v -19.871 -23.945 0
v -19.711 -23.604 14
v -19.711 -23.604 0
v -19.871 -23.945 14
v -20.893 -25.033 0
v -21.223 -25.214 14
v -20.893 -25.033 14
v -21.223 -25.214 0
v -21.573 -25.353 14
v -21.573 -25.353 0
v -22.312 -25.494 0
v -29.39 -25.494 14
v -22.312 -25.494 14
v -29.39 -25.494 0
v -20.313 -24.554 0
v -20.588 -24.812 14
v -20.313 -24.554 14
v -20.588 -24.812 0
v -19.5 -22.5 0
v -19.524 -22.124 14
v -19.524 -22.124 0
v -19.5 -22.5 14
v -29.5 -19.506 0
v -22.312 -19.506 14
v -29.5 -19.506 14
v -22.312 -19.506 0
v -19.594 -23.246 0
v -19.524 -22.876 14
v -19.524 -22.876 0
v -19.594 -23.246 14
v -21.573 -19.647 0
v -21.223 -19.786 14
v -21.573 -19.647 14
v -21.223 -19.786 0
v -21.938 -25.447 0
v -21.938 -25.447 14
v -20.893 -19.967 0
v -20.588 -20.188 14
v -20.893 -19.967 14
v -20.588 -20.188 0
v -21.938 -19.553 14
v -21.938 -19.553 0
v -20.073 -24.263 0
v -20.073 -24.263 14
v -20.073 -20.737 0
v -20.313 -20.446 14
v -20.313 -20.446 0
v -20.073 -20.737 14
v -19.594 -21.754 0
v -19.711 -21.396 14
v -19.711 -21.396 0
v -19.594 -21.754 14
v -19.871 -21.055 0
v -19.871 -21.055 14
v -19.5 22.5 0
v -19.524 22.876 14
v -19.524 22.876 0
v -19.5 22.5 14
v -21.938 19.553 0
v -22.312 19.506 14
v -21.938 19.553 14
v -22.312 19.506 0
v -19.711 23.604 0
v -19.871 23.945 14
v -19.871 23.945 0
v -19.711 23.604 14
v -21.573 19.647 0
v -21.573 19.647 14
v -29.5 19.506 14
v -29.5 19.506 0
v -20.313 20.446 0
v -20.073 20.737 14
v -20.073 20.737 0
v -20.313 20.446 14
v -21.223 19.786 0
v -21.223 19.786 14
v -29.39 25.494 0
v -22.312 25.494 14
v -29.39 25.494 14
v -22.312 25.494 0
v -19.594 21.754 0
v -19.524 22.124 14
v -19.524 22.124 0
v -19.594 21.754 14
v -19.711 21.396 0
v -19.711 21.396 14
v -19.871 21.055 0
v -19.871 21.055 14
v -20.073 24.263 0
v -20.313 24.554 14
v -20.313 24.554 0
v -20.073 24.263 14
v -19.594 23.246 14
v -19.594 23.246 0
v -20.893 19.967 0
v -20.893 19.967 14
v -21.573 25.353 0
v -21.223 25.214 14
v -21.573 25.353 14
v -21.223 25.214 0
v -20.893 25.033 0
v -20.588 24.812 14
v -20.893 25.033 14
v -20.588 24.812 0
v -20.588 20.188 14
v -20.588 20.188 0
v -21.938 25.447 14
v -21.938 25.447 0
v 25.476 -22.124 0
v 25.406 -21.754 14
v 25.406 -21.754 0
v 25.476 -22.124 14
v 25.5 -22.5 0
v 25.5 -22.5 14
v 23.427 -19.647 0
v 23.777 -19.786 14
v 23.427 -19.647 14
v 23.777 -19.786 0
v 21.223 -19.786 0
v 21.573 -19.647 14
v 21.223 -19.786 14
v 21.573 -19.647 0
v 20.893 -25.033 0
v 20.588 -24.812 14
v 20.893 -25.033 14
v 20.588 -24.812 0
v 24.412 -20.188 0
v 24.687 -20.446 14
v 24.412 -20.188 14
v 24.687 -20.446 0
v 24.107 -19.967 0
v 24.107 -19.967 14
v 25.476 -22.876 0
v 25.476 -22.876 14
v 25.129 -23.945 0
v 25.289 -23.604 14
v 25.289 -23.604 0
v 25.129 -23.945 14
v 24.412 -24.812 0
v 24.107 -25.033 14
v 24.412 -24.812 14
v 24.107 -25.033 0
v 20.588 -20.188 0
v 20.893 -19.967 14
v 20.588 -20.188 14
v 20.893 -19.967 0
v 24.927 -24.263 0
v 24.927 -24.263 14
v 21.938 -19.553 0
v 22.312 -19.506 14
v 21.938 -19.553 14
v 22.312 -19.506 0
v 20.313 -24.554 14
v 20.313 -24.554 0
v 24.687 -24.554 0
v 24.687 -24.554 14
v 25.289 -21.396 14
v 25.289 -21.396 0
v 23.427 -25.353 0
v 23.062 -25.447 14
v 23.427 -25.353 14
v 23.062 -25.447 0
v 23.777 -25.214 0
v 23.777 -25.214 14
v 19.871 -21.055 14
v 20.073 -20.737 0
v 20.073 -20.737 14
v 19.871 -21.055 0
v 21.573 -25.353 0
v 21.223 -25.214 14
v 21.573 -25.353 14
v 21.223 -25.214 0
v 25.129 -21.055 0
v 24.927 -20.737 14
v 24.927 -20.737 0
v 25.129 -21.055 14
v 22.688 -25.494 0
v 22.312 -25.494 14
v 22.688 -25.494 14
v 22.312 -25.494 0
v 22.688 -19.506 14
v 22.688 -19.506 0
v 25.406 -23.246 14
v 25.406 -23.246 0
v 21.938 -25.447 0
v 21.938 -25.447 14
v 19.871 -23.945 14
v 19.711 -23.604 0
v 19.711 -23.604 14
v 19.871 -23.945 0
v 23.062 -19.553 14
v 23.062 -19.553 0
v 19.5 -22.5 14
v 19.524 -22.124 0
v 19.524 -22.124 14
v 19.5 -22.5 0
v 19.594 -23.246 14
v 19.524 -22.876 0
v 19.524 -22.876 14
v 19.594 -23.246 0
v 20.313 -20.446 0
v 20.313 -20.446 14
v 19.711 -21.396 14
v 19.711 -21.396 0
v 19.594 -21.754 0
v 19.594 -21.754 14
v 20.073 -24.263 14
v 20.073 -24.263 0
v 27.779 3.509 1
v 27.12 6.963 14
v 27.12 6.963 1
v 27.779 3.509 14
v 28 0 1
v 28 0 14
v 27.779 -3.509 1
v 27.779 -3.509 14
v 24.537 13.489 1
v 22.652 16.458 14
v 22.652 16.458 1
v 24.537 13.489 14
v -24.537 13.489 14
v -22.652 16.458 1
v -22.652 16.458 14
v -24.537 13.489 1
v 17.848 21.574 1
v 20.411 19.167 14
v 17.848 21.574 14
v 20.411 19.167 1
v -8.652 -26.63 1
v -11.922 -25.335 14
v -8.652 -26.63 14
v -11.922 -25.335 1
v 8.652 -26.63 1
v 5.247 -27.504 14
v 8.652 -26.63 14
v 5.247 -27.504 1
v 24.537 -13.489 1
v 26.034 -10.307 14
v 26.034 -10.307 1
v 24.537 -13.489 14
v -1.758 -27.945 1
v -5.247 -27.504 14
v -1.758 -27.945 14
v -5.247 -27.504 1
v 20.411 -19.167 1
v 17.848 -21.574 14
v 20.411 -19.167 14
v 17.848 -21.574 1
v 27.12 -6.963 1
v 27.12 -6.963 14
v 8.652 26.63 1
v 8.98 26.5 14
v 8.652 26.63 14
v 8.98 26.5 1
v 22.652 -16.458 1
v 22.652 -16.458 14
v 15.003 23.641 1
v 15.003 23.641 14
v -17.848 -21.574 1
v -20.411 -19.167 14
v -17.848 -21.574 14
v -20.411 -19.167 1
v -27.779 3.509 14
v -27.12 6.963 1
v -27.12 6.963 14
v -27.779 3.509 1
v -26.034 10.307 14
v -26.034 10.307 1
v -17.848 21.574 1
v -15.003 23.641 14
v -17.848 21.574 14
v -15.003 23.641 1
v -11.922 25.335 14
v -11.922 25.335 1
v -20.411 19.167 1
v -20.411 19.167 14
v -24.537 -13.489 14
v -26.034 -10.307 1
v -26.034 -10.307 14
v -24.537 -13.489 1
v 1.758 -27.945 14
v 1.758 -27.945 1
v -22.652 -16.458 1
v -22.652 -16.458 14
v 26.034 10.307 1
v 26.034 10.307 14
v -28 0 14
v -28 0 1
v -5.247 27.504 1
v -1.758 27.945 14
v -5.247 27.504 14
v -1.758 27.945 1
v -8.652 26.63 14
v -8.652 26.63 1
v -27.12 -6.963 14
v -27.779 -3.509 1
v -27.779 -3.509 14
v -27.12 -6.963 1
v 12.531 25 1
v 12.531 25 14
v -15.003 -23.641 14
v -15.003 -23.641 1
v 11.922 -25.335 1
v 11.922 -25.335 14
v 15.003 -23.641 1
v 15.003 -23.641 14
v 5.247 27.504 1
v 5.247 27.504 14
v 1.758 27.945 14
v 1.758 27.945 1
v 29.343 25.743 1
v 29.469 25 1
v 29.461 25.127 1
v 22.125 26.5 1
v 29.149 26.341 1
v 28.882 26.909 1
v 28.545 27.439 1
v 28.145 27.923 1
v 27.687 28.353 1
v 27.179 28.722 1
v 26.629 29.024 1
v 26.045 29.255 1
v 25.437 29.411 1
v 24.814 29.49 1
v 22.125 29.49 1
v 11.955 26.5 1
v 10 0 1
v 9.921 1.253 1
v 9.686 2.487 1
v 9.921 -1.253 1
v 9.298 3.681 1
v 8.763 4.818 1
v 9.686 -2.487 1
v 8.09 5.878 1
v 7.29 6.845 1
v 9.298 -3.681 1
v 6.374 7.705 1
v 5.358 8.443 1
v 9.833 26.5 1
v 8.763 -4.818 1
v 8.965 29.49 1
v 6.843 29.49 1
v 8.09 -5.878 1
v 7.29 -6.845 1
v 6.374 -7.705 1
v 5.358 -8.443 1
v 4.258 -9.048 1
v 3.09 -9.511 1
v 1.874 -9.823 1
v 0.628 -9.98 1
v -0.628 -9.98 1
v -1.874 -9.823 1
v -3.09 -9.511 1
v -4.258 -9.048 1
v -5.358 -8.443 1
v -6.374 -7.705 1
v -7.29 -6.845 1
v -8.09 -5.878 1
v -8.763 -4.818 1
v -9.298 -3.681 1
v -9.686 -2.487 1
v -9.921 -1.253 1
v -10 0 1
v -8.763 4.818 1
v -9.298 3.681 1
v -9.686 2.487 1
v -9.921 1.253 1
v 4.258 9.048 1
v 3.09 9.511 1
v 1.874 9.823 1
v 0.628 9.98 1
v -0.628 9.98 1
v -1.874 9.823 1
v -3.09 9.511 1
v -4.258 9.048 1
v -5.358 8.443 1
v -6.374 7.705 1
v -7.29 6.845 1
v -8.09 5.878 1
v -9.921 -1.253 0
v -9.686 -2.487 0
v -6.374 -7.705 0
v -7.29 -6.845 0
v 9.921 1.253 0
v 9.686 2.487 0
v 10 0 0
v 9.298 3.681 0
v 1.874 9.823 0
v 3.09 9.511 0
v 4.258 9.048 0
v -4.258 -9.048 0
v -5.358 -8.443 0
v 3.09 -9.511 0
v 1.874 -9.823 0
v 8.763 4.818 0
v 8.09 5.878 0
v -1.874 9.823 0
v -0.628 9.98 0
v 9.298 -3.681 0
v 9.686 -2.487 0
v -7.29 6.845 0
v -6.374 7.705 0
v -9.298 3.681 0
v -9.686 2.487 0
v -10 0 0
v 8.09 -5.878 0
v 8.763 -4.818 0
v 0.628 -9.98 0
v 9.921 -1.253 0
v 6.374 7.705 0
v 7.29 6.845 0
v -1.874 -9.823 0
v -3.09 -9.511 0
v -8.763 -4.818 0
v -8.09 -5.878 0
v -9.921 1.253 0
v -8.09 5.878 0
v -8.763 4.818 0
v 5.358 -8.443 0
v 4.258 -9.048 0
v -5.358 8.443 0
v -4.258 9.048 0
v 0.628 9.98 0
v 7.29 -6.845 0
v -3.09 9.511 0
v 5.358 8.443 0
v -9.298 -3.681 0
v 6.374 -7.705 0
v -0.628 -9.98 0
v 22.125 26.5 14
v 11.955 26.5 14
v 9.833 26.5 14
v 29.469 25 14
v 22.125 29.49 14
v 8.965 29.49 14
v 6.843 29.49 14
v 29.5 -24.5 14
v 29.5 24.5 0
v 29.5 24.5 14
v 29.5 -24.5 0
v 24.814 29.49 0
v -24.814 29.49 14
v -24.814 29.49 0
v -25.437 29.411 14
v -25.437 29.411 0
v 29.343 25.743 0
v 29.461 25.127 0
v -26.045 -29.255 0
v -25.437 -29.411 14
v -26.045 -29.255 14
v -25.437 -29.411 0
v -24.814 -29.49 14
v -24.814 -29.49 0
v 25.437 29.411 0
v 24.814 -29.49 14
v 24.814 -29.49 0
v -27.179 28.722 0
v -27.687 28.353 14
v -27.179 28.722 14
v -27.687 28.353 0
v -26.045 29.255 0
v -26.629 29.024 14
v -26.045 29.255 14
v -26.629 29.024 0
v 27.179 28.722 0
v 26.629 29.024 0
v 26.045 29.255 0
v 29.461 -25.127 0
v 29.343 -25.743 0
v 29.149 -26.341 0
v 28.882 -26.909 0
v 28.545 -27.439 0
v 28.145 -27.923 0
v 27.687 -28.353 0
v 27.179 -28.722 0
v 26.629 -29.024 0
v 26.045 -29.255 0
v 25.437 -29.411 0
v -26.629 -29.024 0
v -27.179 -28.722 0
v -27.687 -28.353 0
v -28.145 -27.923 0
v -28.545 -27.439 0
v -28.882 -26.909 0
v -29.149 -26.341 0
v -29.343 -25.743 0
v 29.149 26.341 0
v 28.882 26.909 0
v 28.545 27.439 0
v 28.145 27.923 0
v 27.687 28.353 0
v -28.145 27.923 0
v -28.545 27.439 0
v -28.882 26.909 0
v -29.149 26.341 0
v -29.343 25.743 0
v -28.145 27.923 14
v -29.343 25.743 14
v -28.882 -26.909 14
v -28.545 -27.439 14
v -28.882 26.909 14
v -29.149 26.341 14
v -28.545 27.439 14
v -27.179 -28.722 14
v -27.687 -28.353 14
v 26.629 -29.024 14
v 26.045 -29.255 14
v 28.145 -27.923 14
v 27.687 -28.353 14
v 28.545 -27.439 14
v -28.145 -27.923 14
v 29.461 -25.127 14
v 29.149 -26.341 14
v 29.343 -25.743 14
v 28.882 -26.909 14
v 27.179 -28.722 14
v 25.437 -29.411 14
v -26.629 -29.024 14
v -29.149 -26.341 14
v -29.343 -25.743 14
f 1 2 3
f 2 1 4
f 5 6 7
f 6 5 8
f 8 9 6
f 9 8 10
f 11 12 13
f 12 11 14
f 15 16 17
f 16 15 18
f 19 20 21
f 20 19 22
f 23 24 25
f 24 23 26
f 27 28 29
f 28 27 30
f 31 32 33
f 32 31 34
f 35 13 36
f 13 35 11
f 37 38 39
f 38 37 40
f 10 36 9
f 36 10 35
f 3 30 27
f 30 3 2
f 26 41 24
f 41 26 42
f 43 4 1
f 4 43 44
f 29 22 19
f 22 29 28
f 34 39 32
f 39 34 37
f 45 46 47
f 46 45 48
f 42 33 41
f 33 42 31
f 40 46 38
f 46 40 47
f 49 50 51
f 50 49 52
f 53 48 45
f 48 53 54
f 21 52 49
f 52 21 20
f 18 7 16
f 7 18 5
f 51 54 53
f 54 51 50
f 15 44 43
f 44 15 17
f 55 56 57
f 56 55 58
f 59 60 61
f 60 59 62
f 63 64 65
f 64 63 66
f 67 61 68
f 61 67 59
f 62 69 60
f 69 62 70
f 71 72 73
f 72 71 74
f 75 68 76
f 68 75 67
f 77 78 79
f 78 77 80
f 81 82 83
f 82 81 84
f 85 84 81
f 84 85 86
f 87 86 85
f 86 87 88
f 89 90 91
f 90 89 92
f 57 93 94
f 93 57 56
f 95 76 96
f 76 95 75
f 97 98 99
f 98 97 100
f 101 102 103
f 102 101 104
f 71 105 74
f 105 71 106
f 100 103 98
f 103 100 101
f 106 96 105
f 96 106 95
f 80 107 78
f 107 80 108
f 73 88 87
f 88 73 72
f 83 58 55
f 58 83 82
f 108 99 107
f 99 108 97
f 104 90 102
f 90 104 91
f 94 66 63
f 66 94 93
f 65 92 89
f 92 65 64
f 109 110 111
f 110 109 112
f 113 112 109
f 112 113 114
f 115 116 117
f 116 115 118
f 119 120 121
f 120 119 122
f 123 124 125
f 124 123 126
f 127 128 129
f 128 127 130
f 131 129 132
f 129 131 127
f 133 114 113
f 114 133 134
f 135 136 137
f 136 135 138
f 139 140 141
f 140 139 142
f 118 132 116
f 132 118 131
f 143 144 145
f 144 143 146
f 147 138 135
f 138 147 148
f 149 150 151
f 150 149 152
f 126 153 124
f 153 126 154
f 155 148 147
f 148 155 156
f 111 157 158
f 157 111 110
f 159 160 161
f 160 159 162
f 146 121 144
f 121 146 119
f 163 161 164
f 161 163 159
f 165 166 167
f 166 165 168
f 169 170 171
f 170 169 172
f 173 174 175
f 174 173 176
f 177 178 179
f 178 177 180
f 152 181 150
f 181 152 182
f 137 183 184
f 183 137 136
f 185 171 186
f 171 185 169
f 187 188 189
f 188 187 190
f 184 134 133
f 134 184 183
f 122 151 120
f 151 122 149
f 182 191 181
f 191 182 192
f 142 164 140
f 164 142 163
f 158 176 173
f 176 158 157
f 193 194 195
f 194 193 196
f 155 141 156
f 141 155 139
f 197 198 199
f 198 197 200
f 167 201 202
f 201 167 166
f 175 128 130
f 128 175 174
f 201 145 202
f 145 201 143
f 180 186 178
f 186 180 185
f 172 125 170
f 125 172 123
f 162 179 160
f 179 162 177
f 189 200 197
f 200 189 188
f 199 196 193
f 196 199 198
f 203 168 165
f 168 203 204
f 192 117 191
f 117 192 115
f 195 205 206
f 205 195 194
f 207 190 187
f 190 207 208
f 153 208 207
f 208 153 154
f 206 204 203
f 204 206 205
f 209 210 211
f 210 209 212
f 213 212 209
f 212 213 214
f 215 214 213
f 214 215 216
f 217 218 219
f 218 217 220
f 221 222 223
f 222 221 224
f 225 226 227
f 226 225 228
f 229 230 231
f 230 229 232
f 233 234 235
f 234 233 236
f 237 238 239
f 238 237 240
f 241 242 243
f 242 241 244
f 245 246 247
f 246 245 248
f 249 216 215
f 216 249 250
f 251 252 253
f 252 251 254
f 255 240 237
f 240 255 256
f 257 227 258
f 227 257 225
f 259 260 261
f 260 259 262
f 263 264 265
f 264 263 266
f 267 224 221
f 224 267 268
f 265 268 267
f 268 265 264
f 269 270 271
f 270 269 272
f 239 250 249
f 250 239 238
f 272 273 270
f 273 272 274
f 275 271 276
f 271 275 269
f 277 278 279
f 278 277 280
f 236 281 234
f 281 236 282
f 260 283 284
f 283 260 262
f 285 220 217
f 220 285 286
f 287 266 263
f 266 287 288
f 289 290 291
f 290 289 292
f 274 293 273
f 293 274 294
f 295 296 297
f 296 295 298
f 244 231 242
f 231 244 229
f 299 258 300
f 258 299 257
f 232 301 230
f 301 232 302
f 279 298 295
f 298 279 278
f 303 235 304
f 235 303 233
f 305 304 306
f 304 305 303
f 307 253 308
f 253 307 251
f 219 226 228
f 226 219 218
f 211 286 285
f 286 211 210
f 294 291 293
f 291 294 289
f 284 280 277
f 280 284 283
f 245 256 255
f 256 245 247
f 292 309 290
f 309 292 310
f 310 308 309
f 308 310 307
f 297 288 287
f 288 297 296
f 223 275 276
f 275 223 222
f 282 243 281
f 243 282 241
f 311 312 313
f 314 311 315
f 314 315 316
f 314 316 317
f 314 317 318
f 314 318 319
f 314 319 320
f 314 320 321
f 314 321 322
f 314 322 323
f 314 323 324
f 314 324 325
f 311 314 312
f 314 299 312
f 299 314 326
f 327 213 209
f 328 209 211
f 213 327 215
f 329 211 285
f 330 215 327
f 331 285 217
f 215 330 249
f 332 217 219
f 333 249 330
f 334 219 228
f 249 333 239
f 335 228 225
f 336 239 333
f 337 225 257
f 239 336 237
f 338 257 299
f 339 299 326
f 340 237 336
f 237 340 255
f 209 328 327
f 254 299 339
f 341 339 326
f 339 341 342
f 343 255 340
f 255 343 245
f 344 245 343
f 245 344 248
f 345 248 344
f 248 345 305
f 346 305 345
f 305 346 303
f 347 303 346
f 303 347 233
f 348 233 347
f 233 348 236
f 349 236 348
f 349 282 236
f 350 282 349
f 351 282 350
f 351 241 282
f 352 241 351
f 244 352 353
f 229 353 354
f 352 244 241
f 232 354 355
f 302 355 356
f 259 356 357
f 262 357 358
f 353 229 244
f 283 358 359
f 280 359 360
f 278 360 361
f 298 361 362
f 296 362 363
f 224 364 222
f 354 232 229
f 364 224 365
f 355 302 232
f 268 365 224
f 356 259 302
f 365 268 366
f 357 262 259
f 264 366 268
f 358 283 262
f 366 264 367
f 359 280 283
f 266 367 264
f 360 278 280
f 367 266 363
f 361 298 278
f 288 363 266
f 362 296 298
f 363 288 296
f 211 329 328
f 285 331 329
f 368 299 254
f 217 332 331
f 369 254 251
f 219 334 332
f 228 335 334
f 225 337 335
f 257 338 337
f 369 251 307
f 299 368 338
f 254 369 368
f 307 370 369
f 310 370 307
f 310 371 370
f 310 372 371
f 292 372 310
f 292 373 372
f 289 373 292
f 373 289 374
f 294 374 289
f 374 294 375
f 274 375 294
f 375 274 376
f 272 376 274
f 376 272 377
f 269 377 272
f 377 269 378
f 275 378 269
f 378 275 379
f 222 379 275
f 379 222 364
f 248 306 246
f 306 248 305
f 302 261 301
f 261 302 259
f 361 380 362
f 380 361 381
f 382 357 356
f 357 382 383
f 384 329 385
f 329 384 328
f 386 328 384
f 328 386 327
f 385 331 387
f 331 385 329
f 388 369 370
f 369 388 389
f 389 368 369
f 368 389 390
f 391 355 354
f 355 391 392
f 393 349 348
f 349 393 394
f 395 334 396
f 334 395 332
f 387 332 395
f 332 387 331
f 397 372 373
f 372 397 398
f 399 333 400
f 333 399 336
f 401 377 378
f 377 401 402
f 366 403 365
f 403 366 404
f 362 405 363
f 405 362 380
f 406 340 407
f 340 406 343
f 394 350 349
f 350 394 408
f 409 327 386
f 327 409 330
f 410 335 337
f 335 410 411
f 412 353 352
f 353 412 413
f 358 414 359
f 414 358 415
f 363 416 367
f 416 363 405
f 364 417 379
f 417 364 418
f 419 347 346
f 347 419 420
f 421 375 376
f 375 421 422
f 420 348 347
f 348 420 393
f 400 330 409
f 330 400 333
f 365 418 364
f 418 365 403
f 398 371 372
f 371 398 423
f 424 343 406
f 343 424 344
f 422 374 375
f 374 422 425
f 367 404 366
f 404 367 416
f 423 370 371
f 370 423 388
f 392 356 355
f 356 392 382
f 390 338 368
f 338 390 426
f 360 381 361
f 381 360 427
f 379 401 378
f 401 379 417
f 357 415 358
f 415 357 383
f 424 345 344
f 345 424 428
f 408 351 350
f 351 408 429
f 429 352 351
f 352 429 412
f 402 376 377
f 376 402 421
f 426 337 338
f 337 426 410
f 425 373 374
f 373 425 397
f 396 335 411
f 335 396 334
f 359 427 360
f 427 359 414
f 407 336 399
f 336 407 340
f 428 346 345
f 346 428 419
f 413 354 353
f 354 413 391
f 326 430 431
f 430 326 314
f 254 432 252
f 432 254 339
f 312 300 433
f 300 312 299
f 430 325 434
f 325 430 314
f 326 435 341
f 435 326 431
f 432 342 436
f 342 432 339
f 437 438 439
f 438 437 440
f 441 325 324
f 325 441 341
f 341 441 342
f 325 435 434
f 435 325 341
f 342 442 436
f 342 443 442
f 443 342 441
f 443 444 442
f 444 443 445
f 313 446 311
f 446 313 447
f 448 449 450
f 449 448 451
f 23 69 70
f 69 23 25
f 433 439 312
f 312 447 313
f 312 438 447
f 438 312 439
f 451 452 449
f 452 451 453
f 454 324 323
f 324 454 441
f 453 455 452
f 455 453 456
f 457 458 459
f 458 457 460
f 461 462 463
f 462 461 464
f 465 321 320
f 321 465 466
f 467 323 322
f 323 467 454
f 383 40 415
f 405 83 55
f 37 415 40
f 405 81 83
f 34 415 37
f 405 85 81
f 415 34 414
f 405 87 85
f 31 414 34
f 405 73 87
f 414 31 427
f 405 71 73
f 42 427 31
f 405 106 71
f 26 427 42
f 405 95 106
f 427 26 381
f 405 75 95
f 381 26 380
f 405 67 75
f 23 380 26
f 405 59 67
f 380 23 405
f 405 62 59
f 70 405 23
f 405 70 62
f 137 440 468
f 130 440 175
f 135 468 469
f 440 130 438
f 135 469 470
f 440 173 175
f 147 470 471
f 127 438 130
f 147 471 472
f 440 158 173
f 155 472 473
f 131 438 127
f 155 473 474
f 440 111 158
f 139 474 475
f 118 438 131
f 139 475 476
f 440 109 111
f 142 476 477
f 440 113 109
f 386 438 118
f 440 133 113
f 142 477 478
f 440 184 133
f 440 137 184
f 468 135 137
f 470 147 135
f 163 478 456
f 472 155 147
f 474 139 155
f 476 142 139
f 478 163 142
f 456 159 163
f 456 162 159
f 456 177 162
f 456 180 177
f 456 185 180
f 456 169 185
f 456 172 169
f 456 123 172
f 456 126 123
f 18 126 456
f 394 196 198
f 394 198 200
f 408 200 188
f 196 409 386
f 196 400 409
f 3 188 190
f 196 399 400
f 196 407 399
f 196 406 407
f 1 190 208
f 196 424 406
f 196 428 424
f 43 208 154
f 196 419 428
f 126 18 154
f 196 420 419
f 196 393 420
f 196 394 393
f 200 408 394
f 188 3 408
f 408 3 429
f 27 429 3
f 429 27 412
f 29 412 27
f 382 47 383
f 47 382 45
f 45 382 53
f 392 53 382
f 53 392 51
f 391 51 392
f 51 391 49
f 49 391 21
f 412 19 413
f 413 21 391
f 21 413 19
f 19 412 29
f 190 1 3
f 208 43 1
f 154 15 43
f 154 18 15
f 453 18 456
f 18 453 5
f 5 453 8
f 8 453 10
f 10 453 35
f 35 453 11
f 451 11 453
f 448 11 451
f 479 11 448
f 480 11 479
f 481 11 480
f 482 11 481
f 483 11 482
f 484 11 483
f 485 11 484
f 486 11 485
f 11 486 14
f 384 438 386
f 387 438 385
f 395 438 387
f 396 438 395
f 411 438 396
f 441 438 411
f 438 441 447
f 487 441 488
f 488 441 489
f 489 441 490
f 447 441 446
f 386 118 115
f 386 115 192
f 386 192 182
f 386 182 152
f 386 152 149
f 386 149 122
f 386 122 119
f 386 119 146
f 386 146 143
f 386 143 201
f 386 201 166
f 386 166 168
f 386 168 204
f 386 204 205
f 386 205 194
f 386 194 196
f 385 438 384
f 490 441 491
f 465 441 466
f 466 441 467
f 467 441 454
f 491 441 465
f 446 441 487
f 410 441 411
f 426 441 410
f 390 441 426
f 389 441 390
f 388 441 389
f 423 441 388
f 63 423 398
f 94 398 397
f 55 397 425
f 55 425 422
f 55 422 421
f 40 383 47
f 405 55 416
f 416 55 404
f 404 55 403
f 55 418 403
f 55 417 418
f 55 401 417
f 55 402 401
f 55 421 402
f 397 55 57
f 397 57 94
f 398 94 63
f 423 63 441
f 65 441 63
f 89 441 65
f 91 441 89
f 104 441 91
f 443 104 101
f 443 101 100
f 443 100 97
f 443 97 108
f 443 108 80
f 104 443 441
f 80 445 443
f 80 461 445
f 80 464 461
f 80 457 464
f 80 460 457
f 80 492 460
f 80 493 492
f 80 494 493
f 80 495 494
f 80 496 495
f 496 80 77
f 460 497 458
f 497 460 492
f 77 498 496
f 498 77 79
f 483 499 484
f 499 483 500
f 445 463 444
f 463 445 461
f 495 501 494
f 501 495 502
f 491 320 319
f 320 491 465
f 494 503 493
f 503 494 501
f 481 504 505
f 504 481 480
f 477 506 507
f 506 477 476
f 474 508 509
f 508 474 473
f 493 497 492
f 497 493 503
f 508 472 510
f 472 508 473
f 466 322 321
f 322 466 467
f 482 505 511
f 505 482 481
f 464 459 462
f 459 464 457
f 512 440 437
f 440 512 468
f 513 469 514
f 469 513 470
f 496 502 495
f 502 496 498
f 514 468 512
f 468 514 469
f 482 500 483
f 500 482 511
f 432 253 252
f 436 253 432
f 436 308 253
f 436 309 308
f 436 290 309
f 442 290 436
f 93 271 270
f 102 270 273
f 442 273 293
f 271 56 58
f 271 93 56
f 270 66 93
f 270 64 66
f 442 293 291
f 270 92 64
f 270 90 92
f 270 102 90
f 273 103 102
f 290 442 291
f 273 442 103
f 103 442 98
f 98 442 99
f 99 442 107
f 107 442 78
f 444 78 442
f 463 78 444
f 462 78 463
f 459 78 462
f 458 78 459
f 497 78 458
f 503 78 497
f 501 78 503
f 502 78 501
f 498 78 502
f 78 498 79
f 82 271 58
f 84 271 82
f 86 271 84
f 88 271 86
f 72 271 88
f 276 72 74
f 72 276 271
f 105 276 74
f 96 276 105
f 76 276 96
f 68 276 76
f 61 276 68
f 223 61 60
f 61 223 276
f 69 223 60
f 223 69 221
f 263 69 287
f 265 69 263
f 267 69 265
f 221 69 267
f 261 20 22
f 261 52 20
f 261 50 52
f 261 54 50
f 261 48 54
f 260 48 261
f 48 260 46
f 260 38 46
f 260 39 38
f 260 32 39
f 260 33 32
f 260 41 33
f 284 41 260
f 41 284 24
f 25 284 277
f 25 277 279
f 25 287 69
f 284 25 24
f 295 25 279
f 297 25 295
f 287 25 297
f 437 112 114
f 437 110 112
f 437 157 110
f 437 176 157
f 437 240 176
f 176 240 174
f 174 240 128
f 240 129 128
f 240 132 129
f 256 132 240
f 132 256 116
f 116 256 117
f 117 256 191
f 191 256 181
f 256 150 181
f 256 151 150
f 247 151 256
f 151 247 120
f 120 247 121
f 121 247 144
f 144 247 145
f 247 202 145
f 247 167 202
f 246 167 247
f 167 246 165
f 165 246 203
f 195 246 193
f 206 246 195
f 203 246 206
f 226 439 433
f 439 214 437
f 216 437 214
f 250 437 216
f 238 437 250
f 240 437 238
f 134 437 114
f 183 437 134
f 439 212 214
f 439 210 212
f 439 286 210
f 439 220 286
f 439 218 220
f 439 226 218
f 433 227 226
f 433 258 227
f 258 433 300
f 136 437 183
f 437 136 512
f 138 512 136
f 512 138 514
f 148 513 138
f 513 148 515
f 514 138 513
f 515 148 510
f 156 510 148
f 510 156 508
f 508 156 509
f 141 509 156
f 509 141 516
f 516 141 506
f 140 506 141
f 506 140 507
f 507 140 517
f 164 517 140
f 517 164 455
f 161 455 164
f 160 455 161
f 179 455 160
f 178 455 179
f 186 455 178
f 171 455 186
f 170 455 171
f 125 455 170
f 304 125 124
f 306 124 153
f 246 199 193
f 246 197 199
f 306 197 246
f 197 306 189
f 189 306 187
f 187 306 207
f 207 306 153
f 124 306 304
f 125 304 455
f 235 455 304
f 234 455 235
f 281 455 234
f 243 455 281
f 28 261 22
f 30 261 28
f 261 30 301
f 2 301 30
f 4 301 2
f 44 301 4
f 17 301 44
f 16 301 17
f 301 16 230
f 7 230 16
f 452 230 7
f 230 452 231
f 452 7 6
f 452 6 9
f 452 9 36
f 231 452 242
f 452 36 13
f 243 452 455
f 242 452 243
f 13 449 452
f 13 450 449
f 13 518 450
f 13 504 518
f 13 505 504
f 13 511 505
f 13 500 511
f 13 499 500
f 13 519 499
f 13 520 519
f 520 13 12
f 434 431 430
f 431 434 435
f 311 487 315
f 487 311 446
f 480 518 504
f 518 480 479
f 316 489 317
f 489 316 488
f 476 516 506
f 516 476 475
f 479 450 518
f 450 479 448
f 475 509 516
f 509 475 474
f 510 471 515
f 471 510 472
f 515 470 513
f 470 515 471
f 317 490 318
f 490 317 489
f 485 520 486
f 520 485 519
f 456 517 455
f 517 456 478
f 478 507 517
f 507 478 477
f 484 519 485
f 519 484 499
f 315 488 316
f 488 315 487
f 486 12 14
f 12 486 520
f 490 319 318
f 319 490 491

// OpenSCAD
$fn = 50;


difference() {
	union() {
		translate(v = [0, 0, 0]) {
			rotate(a = [0, 0, 0]) {
				hull() {
					translate(v = [-24.5000000000, 24.5000000000, 0]) {
						rotate(a = [0, 0, 0]) {
							translate(v = [0, 0, 0]) {
								rotate(a = [0, 0, 0]) {
									cylinder(h = 14, r = 5);
								}
							}
						}
					}
					translate(v = [24.5000000000, 24.5000000000, 0]) {
						rotate(a = [0, 0, 0]) {
							translate(v = [0, 0, 0]) {
								rotate(a = [0, 0, 0]) {
									cylinder(h = 14, r = 5);
								}
							}
						}
					}
					translate(v = [-24.5000000000, -24.5000000000, 0]) {
						rotate(a = [0, 0, 0]) {
							translate(v = [0, 0, 0]) {
								rotate(a = [0, 0, 0]) {
									cylinder(h = 14, r = 5);
								}
							}
						}
					}
					translate(v = [24.5000000000, -24.5000000000, 0]) {
						rotate(a = [0, 0, 0]) {
							translate(v = [0, 0, 0]) {
								rotate(a = [0, 0, 0]) {
									cylinder(h = 14, r = 5);
								}
							}
						}
					}
				}
			}
		}
	}
	union() {
		translate(v = [-30.0000000000, -22.5000000000, -125]) {
			rotate(a = [0, 0, 0]) {
				hull() {
					translate(v = [7.5000000000, 0, 0]) {
						rotate(a = [0, 0, 0]) {
							translate(v = [0, 0, 0]) {
								rotate(a = [0, 0, 0]) {
									cylinder(h = 250, r = 3.0000000000);
								}
							}
						}
					}
					translate(v = [-7.5000000000, 0, 0]) {
						rotate(a = [0, 0, 0]) {
							translate(v = [0, 0, 0]) {
								rotate(a = [0, 0, 0]) {
									cylinder(h = 250, r = 3.0000000000);
								}
							}
						}
					}
				}
			}
		}
		translate(v = [-30.0000000000, 22.5000000000, -125]) {
			rotate(a = [0, 0, 0]) {
				hull() {
					translate(v = [7.5000000000, 0, 0]) {
						rotate(a = [0, 0, 0]) {
							translate(v = [0, 0, 0]) {
								rotate(a = [0, 0, 0]) {
									cylinder(h = 250, r = 3.0000000000);
								}
							}
						}
					}
					translate(v = [-7.5000000000, 0, 0]) {
						rotate(a = [0, 0, 0]) {
							translate(v = [0, 0, 0]) {
								rotate(a = [0, 0, 0]) {
									cylinder(h = 250, r = 3.0000000000);
								}
							}
						}
					}
				}
			}
		}
		translate(v = [22.5000000000, -22.5000000000, -125.0000000000]) {
			rotate(a = [0, 0, 0]) {
				cylinder(h = 250, r = 3.0000000000);
			}
		}
		translate(v = [0, 0, 1.0000000000]) {
			rotate(a = [0, 0, 0]) {
				cylinder(h = 16, r = 28.0000000000);
			}
		}
		translate(v = [0, 0, -7.0000000000]) {
			rotate(a = [0, 0, 0]) {
				cylinder(h = 14, r = 10.0000000000);
			}
		}
		translate(v = [0.0000000000, 25.0000000000, 1]) {
			rotate(a = [0, 0, 0]) {
				cube(size = [29.5000000000, 1.5000000000, 16]);
			}
		}
		translate(v = [22.1250000000, 25.0000000000, 1]) {
			rotate(a = [0, 0, 0]) {
				cube(size = [7.3750000000, 4.5000000000, 16]);
			}
		}
		translate(v = [6.0833333333, 30.2500000000, 1]) {
			rotate(a = [0, 0, -45]) {
				cube(size = [7.5000000000, 1.5000000000, 16]);
			}
		}
	}
}
